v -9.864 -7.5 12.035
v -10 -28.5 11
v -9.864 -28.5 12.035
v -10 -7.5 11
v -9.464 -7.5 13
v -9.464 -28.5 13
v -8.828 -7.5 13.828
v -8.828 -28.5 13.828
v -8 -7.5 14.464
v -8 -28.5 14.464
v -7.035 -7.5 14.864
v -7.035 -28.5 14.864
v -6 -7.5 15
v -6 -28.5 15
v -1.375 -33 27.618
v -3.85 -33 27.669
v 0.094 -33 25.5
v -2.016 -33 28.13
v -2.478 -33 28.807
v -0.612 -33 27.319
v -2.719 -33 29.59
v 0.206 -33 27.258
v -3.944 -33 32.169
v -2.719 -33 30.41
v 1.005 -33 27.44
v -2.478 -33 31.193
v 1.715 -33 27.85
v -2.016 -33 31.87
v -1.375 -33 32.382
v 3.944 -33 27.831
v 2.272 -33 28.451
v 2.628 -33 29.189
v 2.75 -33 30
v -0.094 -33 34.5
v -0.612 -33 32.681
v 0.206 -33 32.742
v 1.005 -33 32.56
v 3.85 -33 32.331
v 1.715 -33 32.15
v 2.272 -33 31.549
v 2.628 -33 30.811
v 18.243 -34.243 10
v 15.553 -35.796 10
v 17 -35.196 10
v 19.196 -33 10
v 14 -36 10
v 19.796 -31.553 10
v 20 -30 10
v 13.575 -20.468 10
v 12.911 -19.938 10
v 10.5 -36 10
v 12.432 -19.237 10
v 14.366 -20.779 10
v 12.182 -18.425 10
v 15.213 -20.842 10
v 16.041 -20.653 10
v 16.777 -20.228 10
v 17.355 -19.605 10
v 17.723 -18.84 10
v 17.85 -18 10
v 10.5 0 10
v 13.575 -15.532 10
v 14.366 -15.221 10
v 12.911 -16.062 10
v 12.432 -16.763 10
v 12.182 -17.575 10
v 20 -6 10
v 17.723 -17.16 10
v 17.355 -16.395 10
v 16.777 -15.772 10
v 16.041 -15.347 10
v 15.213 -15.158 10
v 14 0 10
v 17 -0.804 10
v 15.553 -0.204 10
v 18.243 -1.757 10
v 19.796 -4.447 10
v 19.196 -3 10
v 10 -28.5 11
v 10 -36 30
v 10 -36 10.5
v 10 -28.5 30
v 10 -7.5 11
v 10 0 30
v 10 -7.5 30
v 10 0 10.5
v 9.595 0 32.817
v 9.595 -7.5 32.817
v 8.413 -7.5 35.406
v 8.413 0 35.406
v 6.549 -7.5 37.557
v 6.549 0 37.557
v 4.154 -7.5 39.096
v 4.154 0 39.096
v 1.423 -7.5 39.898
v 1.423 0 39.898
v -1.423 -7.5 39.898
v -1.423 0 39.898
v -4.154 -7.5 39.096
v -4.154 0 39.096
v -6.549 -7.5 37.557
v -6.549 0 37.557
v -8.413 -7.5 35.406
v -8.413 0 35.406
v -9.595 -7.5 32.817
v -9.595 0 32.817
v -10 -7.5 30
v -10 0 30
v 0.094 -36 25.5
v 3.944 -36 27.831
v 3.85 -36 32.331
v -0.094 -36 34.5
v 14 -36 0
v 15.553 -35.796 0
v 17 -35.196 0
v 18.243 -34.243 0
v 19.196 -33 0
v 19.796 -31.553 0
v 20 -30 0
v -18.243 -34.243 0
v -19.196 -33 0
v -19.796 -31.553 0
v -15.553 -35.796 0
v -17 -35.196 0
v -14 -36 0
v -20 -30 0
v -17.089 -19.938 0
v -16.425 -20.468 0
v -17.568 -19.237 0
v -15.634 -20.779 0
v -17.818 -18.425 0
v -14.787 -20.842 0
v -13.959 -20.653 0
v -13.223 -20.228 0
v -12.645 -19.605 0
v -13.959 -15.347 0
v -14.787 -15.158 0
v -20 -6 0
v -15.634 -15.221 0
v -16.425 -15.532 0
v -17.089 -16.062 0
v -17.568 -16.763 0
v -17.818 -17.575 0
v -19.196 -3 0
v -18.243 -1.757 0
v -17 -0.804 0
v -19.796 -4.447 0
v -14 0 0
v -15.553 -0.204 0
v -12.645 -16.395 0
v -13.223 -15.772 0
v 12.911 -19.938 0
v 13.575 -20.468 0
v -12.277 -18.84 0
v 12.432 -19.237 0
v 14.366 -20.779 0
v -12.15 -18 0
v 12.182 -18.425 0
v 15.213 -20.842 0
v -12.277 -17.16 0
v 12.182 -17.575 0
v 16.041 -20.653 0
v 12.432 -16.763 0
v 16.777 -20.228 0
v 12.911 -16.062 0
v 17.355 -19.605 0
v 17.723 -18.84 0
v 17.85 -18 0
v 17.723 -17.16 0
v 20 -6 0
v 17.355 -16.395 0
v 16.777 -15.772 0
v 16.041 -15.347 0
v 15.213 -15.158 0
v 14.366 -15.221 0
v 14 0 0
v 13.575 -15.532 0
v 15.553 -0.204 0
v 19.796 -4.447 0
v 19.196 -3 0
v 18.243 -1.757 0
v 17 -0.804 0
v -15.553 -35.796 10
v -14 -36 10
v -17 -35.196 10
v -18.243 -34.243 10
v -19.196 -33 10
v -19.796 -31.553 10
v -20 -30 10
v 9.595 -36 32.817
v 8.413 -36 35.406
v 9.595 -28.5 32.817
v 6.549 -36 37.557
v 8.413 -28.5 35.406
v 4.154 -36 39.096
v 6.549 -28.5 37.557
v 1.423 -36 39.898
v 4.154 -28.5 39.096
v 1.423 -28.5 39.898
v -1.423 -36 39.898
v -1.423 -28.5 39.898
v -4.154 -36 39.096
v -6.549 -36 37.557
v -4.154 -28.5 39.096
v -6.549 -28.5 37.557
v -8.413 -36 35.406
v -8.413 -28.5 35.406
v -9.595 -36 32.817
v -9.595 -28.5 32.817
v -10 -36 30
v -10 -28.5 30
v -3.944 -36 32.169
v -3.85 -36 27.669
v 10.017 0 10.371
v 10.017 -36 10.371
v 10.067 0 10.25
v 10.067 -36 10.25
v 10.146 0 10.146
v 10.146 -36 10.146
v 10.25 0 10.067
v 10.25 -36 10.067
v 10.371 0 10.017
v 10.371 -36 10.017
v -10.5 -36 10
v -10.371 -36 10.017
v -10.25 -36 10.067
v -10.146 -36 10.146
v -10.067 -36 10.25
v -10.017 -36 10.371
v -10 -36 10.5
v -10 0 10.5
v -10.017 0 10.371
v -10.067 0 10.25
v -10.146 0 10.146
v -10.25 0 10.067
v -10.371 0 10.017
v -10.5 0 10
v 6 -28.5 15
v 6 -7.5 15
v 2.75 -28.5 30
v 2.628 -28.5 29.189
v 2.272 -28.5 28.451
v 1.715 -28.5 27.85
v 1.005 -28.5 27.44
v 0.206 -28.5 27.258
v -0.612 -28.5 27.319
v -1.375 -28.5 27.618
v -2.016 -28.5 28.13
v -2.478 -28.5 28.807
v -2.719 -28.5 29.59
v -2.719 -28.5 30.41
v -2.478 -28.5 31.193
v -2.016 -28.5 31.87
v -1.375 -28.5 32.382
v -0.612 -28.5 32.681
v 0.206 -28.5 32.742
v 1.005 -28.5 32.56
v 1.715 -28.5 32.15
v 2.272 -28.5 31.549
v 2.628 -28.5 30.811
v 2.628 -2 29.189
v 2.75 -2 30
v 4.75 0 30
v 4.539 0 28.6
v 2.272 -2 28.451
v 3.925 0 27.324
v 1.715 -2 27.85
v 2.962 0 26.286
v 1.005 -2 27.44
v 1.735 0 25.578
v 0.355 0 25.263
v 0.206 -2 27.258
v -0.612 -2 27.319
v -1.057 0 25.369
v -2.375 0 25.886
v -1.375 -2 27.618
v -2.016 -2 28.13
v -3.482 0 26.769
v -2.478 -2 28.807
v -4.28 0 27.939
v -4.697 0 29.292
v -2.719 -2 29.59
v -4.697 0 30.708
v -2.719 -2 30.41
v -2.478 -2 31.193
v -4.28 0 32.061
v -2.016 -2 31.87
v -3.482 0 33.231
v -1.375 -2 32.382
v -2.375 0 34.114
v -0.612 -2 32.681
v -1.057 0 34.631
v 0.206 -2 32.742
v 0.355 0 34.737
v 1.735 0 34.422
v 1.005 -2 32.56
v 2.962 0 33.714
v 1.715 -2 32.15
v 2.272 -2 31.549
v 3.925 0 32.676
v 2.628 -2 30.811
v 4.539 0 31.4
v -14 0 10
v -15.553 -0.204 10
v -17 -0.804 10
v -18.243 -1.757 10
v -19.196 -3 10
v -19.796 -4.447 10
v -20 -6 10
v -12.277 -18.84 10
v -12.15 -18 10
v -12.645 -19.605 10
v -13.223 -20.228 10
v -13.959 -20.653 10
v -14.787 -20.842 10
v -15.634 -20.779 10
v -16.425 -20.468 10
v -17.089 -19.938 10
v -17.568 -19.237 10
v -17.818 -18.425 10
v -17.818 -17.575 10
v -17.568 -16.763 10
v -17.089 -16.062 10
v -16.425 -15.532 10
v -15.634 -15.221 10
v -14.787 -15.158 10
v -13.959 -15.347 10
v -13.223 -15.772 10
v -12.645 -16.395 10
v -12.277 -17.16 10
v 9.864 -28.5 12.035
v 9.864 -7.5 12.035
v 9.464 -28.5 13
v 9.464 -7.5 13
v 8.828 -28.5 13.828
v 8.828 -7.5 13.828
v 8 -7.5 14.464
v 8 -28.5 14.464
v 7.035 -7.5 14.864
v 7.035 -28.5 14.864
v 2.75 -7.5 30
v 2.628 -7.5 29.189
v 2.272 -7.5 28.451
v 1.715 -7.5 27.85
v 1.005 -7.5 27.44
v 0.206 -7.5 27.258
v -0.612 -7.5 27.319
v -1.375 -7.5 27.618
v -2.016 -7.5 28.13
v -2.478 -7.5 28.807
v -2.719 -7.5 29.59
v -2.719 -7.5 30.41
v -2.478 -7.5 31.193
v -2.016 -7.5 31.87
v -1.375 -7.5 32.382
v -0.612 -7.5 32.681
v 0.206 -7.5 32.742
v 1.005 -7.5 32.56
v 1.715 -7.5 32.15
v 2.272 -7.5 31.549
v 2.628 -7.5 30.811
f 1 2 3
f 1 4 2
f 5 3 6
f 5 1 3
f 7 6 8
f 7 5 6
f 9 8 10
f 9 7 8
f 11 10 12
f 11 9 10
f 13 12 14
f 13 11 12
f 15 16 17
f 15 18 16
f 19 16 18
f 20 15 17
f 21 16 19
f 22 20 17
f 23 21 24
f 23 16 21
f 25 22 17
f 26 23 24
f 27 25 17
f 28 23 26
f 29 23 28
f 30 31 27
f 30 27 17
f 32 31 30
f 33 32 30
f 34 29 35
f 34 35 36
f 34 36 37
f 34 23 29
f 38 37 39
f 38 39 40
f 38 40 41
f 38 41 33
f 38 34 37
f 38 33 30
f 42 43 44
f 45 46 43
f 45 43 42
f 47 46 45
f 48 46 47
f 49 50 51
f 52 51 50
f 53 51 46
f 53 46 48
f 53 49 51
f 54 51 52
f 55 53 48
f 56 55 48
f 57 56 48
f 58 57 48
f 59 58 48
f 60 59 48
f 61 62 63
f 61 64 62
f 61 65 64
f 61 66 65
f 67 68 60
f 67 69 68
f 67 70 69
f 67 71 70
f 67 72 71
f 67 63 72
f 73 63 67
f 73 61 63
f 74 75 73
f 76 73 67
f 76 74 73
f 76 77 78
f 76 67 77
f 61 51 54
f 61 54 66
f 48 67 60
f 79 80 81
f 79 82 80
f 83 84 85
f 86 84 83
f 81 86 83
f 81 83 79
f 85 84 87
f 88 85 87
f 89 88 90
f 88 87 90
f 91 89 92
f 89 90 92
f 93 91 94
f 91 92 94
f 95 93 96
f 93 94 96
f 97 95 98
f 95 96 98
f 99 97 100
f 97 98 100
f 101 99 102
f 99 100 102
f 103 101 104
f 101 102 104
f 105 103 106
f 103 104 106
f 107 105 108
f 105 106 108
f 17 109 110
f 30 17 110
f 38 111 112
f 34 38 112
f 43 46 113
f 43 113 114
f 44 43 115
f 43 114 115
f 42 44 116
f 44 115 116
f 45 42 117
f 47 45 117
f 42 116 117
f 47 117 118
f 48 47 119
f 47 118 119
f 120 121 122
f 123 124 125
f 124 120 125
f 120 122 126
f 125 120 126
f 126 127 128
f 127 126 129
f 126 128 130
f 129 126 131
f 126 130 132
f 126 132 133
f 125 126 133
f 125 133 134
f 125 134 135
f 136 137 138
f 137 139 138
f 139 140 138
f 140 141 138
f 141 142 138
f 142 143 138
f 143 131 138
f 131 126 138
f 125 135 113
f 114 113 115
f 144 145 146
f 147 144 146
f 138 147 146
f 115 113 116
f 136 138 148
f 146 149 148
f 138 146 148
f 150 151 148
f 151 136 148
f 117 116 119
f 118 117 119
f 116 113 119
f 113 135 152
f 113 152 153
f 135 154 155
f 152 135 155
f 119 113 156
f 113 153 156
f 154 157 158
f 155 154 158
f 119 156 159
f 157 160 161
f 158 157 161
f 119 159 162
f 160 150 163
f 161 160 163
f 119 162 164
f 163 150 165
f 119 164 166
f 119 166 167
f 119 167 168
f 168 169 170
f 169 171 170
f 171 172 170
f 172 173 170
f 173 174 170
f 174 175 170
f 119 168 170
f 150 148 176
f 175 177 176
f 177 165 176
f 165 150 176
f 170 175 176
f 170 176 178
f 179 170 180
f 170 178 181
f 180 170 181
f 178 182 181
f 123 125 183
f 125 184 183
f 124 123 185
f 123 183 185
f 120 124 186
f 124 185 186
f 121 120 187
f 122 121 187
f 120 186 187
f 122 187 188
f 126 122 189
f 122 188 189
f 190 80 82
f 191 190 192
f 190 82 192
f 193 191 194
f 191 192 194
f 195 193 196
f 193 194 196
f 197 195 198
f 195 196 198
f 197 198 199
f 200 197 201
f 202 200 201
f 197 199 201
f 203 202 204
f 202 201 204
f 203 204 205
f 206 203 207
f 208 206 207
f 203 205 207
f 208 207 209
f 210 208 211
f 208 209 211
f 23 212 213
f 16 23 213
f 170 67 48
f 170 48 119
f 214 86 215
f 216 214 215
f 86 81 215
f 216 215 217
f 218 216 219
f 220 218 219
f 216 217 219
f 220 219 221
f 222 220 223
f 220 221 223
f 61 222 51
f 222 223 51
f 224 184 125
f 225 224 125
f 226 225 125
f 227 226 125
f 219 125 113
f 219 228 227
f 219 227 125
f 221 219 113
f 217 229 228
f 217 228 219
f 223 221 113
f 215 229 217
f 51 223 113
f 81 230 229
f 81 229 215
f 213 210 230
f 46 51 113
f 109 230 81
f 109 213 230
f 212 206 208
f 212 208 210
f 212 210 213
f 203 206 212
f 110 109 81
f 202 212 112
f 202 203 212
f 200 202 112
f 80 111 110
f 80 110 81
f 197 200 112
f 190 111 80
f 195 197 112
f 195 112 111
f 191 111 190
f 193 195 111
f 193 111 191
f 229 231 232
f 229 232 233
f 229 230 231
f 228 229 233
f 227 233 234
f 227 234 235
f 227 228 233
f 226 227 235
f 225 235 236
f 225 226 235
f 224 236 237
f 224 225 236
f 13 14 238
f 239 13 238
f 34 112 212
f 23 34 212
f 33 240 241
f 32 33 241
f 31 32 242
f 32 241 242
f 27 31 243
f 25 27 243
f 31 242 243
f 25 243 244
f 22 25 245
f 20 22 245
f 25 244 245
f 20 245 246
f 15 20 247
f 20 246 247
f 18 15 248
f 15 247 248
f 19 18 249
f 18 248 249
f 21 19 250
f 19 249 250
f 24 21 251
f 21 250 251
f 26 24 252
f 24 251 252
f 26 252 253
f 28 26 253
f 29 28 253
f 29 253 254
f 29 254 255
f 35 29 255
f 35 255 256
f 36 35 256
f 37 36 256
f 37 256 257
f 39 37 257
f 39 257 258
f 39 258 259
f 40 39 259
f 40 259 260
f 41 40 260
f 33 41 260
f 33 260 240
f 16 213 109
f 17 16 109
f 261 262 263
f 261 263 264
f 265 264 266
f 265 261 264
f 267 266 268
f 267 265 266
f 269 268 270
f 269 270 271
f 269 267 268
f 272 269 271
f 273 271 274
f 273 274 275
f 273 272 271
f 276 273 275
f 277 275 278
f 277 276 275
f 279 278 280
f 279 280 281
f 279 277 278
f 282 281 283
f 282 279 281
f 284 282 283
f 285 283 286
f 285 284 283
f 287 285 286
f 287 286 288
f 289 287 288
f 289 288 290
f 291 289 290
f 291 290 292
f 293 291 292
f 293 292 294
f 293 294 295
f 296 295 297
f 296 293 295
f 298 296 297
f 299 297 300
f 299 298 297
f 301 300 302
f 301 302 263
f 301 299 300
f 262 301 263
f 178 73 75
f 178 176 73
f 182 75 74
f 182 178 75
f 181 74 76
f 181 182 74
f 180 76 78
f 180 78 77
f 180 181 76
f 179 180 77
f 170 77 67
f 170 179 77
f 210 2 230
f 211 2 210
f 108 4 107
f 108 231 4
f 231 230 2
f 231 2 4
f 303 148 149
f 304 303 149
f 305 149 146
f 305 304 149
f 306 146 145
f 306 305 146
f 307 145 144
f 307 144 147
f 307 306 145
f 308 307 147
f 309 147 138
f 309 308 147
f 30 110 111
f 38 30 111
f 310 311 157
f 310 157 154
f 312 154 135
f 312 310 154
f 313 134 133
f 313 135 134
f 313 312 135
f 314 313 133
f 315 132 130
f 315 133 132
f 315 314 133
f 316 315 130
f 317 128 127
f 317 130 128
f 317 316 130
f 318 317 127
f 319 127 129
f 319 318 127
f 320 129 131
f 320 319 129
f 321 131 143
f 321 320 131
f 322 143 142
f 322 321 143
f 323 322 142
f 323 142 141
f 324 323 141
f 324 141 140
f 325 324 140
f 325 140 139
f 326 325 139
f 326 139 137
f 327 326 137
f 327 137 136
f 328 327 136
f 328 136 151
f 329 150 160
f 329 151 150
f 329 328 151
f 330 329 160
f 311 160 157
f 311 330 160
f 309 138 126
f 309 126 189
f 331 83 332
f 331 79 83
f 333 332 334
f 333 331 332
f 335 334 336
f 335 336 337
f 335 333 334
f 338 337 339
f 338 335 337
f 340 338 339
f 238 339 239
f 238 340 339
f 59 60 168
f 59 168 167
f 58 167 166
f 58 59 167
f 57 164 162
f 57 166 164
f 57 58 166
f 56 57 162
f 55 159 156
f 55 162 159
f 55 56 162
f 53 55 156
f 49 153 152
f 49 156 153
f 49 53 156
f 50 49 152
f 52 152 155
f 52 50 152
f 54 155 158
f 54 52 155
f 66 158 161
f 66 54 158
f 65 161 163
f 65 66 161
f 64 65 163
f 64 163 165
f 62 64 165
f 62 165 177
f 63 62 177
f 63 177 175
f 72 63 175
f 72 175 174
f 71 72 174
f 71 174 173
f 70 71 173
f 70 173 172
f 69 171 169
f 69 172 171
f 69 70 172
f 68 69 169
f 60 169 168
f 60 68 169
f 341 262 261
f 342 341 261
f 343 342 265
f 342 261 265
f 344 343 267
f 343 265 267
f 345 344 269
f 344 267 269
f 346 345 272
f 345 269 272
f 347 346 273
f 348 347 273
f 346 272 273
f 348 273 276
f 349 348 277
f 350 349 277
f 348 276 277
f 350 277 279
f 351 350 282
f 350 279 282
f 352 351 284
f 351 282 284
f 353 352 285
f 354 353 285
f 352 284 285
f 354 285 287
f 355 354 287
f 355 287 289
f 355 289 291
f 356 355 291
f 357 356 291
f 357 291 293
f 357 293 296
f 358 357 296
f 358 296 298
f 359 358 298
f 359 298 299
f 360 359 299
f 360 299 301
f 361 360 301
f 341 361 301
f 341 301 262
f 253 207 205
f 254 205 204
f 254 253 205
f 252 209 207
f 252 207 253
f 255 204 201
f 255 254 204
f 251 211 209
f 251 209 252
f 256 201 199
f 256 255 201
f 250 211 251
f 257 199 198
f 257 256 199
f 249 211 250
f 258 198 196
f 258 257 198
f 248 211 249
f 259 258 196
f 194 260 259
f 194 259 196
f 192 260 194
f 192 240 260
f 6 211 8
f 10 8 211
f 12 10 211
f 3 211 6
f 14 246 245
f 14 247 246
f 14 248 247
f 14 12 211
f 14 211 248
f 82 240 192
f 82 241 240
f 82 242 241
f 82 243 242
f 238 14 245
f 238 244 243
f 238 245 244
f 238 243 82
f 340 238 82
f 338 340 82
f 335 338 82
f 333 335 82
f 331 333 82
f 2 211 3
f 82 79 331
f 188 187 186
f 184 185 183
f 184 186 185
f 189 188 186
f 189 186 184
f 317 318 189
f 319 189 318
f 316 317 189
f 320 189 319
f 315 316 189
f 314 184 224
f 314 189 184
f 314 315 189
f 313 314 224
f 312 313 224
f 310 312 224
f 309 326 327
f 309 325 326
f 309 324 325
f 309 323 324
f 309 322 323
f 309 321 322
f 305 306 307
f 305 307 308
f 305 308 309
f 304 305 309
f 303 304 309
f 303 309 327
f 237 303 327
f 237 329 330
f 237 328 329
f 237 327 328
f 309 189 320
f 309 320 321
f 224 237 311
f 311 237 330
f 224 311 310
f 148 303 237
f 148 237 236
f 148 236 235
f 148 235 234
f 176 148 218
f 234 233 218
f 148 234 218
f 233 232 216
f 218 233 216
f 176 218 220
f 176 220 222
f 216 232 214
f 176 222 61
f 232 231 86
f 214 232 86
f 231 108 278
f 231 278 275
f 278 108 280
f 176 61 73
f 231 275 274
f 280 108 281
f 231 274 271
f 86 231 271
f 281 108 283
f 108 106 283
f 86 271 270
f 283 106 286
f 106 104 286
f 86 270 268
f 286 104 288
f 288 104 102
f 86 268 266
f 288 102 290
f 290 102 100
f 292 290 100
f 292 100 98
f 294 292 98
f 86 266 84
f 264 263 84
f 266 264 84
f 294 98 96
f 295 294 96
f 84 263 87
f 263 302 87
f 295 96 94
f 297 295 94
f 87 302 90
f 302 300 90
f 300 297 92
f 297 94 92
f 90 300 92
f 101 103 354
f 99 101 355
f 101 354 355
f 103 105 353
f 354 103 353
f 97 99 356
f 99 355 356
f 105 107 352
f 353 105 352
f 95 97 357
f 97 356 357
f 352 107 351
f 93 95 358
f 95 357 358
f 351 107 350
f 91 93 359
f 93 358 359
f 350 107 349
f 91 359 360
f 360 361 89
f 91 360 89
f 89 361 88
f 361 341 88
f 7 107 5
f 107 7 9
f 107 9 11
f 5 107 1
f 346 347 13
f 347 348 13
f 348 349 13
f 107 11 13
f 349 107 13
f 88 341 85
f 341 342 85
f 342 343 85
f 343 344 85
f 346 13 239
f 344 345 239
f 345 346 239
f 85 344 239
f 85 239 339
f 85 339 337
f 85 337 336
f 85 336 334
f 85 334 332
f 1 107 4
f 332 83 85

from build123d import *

# Parameters (mm, degrees)
PAD_DEPTH       = 36
SKETCH001_W     = 41.77589
SKETCH001_H     = 47.890068
POCKET_DEPTH    = 10.5
SKETCH002_R     = 2.75
POCKET001_DEPTH = 36.001
FILLET_R        = 4
FILLET001_R     = 0.5
SKETCH003_R     = 2.85
HOLE_DEPTH      = 16.001
FILLET002_R     = 6
CHAMFER_SIZE    = 2
POCKET002_DEPTH = 3


with BuildPart() as part:
    # Sketch → Pad (new body)
    with BuildSketch(Plane.XZ):
        with BuildLine():
            Line((-20, 0), (20, 0))
            Line((20, 10), (20, 0))
            Line((10, 10), (20, 10))
            Line((10, 30), (10, 10))
            ThreePointArc((10, 30), (0, 40), (-10, 30))
            Line((-10, 10), (-10, 30))
            Line((-20, 10), (-10, 10))
            Line((-20, 0), (-20, 10))
        make_face()
    extrude(amount=PAD_DEPTH)

    # Sketch001 (on DatumPlane) → Pocket (cut, symmetric)
    with BuildSketch(Plane(origin=(0, -18, 0), x_dir=(1, 0, 0), z_dir=(0, 1, 0))):
        with Locations((0.131337, -38.945034)):
            Rectangle(SKETCH001_W, SKETCH001_H)
    extrude(amount=POCKET_DEPTH, both=True, mode=Mode.SUBTRACT)

    # Sketch002 (on Face4 of Pocket) → Pocket001 (cut, through all)
    with BuildSketch(Plane(origin=(0, 0, 0), x_dir=(1, 0, 0), z_dir=(0, 1, 0))):
        with Locations((0, -30)):
            Circle(SKETCH002_R)
    extrude(amount=-POCKET001_DEPTH, mode=Mode.SUBTRACT)

    # Fillet
    fillet_edges = [part.edges().sort_by_distance(p)[0] for p in [
        (10, -18, 15),
        (-10, -18, 15),
    ]]
    fillet(fillet_edges, radius=FILLET_R)

    # Fillet001
    fillet001_edges = [part.edges().sort_by_distance(p)[0] for p in [
        (10, -18, 10),
        (-10, -18, 10),
    ]]
    fillet(fillet001_edges, radius=FILLET001_R)

    # Sketch003 (on DatumPlane) → Hole (cut, through all)
    with BuildSketch(Plane(origin=(0, 0, 16), x_dir=(1, 0, 0), z_dir=(0, 0, -1))):
        with Locations((15, 18)):
            Circle(SKETCH003_R)
        with Locations((-15, 18)):
            Circle(SKETCH003_R)
    extrude(amount=HOLE_DEPTH, mode=Mode.SUBTRACT)

    # Fillet002
    fillet002_edges = [part.edges().sort_by_distance(p)[0] for p in [
        (20, 0, 5),
        (-20, 0, 5),
        (-20, -36, 5),
        (20, -36, 5),
    ]]
    fillet(fillet002_edges, radius=FILLET002_R)

    # Chamfer
    chamfer_edges = [part.edges().sort_by_distance(p)[0] for p in [
        (-2.75, 0, 30),
    ]]
    chamfer(chamfer_edges, length=CHAMFER_SIZE)

    # Sketch004 (on Face15 of Chamfer) → Pocket002 (cut)
    with BuildSketch(Plane.XZ.offset(36)):
        Polygon((-0.093793, 34.5), (-3.944011, 32.168773), (-3.850218, 27.668773), (0.093793, 25.5), (3.944011, 27.831227), (3.850218, 32.331227), align=None)
    extrude(amount=-POCKET002_DEPTH, mode=Mode.SUBTRACT)


solid = part.part
